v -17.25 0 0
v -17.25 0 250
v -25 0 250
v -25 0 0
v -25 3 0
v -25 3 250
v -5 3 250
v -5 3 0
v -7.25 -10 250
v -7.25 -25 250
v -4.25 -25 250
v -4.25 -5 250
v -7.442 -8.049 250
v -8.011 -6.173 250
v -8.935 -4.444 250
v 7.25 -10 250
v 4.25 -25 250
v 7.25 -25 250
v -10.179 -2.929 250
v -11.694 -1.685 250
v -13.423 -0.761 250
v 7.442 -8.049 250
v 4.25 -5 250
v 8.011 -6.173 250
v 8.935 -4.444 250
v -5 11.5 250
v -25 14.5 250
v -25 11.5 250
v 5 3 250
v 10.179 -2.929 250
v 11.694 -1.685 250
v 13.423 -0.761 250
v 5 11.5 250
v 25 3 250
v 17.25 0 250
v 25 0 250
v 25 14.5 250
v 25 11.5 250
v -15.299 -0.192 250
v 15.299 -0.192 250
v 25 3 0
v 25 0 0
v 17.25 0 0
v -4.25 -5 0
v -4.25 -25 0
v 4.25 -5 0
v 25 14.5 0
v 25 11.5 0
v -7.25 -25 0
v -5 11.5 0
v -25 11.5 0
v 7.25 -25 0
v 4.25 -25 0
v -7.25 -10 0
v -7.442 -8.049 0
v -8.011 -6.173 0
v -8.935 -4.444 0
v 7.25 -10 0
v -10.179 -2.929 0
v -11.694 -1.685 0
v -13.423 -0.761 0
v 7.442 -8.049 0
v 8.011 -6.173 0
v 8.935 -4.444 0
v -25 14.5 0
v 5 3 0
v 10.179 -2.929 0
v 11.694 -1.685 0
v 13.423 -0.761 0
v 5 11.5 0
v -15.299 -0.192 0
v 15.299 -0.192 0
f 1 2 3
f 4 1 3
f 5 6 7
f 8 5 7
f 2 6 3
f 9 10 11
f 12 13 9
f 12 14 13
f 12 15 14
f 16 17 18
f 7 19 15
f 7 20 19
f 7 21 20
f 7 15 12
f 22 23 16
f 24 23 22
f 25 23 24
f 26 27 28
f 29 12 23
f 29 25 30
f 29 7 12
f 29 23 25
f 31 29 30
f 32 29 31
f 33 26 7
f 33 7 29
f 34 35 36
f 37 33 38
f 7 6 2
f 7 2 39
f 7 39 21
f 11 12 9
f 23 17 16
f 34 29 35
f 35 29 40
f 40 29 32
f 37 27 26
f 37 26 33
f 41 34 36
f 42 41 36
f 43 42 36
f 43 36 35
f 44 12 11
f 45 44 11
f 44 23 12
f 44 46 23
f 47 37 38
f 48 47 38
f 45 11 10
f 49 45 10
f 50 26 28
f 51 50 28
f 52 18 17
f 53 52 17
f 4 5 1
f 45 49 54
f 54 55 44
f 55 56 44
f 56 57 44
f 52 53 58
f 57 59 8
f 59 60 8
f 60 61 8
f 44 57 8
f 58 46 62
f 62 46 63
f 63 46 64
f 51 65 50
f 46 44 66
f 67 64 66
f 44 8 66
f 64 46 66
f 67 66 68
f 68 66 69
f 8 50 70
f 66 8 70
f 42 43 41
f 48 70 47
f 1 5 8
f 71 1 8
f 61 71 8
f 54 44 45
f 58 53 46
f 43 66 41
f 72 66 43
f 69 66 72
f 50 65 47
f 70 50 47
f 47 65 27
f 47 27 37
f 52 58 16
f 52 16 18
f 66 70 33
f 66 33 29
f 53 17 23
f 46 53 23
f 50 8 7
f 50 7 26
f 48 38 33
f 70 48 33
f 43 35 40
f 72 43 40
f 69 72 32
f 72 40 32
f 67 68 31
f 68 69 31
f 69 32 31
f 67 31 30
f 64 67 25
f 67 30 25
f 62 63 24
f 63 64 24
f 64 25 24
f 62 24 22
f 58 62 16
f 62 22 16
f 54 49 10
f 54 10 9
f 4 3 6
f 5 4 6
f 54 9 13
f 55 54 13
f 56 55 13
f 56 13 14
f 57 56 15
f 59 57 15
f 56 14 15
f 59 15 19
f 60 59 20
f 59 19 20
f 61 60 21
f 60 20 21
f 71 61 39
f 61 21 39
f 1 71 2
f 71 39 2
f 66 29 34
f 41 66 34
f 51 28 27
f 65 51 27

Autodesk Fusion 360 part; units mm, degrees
sketch "Schizzo1" plane through (0, 0, 0) normal (0, 0, 1) x (1, 0, 0)
  line L0 (0, 0) -> (-25, 0)
  line L1 (-25, 0) -> (-25, 3)
  line L2 (-25, 3) -> (-5, 3)
  line L3 (-5, 3) -> (-5, 11.5)
  line L4 (-5, 11.5) -> (-25, 11.5)
  line L5 (-25, 11.5) -> (-25, 14.5)
  line L6 (-25, 14.5) -> (0, 14.5)
  line L7 (0, 14.5) -> (0, 0)
  line L8 (0, 14.5) -> (25, 14.5)
  line L9 (5, 11.5) -> (5, 3)
  line L10 (0, 0) -> (0, 14.5)
  line L11 (25, 0) -> (0, 0)
  line L12 (5, 3) -> (25, 3)
  line L13 (25, 14.5) -> (25, 11.5)
  line L14 (25, 3) -> (25, 0)
  line L15 (25, 11.5) -> (5, 11.5)
  line L16 (7.25, 0) -> (7.25, -25)
  line L17 (4.25, -5) -> (-4.25, -5)
  line L18 (4.25, -25) -> (4.25, -5)
  line L19 (-7.25, -25) -> (-7.25, 0)
  line L20 (-4.25, -5) -> (-4.25, -25)
  line L21 (-4.25, -25) -> (-7.25, -25)
  line L22 (7.25, -25) -> (4.25, -25)
  line L23 (0, 0) -> (0, -13.3515) construction
  point P0 (0, 14.5)
  point P1 (0, -5)
  dimension "d2" = 8.5
  dimension "d3" = 3
  dimension "d4" = 3
  dimension "d5" = 25
  dimension "d6" = 25
  dimension "d7" = 20
  dimension "d8" = 8.5
  dimension "d9" = 3
  dimension "d10" = 3
  dimension "d11" = 25
  dimension "d12" = 25
  dimension "d23" = 3
  dimension "d24" = 25
  dimension "d25" = 25
  dimension "d26" = 8.5
  dimension "d27" = 3
  dimension "d28" = 20
  dimension "d31" = 5
  dimension "d34" = 4.25
  dimension "d35" = 20
extrude "Estrusione1" add sketch "Schizzo1" along normal blind 250
fillet "Raccordo2" radius 10 2 edges at (-7.25, 0, 125) (7.25, 0, 125)
equation "d34 = ( 8.5 / 2 ) * 1 mm"
